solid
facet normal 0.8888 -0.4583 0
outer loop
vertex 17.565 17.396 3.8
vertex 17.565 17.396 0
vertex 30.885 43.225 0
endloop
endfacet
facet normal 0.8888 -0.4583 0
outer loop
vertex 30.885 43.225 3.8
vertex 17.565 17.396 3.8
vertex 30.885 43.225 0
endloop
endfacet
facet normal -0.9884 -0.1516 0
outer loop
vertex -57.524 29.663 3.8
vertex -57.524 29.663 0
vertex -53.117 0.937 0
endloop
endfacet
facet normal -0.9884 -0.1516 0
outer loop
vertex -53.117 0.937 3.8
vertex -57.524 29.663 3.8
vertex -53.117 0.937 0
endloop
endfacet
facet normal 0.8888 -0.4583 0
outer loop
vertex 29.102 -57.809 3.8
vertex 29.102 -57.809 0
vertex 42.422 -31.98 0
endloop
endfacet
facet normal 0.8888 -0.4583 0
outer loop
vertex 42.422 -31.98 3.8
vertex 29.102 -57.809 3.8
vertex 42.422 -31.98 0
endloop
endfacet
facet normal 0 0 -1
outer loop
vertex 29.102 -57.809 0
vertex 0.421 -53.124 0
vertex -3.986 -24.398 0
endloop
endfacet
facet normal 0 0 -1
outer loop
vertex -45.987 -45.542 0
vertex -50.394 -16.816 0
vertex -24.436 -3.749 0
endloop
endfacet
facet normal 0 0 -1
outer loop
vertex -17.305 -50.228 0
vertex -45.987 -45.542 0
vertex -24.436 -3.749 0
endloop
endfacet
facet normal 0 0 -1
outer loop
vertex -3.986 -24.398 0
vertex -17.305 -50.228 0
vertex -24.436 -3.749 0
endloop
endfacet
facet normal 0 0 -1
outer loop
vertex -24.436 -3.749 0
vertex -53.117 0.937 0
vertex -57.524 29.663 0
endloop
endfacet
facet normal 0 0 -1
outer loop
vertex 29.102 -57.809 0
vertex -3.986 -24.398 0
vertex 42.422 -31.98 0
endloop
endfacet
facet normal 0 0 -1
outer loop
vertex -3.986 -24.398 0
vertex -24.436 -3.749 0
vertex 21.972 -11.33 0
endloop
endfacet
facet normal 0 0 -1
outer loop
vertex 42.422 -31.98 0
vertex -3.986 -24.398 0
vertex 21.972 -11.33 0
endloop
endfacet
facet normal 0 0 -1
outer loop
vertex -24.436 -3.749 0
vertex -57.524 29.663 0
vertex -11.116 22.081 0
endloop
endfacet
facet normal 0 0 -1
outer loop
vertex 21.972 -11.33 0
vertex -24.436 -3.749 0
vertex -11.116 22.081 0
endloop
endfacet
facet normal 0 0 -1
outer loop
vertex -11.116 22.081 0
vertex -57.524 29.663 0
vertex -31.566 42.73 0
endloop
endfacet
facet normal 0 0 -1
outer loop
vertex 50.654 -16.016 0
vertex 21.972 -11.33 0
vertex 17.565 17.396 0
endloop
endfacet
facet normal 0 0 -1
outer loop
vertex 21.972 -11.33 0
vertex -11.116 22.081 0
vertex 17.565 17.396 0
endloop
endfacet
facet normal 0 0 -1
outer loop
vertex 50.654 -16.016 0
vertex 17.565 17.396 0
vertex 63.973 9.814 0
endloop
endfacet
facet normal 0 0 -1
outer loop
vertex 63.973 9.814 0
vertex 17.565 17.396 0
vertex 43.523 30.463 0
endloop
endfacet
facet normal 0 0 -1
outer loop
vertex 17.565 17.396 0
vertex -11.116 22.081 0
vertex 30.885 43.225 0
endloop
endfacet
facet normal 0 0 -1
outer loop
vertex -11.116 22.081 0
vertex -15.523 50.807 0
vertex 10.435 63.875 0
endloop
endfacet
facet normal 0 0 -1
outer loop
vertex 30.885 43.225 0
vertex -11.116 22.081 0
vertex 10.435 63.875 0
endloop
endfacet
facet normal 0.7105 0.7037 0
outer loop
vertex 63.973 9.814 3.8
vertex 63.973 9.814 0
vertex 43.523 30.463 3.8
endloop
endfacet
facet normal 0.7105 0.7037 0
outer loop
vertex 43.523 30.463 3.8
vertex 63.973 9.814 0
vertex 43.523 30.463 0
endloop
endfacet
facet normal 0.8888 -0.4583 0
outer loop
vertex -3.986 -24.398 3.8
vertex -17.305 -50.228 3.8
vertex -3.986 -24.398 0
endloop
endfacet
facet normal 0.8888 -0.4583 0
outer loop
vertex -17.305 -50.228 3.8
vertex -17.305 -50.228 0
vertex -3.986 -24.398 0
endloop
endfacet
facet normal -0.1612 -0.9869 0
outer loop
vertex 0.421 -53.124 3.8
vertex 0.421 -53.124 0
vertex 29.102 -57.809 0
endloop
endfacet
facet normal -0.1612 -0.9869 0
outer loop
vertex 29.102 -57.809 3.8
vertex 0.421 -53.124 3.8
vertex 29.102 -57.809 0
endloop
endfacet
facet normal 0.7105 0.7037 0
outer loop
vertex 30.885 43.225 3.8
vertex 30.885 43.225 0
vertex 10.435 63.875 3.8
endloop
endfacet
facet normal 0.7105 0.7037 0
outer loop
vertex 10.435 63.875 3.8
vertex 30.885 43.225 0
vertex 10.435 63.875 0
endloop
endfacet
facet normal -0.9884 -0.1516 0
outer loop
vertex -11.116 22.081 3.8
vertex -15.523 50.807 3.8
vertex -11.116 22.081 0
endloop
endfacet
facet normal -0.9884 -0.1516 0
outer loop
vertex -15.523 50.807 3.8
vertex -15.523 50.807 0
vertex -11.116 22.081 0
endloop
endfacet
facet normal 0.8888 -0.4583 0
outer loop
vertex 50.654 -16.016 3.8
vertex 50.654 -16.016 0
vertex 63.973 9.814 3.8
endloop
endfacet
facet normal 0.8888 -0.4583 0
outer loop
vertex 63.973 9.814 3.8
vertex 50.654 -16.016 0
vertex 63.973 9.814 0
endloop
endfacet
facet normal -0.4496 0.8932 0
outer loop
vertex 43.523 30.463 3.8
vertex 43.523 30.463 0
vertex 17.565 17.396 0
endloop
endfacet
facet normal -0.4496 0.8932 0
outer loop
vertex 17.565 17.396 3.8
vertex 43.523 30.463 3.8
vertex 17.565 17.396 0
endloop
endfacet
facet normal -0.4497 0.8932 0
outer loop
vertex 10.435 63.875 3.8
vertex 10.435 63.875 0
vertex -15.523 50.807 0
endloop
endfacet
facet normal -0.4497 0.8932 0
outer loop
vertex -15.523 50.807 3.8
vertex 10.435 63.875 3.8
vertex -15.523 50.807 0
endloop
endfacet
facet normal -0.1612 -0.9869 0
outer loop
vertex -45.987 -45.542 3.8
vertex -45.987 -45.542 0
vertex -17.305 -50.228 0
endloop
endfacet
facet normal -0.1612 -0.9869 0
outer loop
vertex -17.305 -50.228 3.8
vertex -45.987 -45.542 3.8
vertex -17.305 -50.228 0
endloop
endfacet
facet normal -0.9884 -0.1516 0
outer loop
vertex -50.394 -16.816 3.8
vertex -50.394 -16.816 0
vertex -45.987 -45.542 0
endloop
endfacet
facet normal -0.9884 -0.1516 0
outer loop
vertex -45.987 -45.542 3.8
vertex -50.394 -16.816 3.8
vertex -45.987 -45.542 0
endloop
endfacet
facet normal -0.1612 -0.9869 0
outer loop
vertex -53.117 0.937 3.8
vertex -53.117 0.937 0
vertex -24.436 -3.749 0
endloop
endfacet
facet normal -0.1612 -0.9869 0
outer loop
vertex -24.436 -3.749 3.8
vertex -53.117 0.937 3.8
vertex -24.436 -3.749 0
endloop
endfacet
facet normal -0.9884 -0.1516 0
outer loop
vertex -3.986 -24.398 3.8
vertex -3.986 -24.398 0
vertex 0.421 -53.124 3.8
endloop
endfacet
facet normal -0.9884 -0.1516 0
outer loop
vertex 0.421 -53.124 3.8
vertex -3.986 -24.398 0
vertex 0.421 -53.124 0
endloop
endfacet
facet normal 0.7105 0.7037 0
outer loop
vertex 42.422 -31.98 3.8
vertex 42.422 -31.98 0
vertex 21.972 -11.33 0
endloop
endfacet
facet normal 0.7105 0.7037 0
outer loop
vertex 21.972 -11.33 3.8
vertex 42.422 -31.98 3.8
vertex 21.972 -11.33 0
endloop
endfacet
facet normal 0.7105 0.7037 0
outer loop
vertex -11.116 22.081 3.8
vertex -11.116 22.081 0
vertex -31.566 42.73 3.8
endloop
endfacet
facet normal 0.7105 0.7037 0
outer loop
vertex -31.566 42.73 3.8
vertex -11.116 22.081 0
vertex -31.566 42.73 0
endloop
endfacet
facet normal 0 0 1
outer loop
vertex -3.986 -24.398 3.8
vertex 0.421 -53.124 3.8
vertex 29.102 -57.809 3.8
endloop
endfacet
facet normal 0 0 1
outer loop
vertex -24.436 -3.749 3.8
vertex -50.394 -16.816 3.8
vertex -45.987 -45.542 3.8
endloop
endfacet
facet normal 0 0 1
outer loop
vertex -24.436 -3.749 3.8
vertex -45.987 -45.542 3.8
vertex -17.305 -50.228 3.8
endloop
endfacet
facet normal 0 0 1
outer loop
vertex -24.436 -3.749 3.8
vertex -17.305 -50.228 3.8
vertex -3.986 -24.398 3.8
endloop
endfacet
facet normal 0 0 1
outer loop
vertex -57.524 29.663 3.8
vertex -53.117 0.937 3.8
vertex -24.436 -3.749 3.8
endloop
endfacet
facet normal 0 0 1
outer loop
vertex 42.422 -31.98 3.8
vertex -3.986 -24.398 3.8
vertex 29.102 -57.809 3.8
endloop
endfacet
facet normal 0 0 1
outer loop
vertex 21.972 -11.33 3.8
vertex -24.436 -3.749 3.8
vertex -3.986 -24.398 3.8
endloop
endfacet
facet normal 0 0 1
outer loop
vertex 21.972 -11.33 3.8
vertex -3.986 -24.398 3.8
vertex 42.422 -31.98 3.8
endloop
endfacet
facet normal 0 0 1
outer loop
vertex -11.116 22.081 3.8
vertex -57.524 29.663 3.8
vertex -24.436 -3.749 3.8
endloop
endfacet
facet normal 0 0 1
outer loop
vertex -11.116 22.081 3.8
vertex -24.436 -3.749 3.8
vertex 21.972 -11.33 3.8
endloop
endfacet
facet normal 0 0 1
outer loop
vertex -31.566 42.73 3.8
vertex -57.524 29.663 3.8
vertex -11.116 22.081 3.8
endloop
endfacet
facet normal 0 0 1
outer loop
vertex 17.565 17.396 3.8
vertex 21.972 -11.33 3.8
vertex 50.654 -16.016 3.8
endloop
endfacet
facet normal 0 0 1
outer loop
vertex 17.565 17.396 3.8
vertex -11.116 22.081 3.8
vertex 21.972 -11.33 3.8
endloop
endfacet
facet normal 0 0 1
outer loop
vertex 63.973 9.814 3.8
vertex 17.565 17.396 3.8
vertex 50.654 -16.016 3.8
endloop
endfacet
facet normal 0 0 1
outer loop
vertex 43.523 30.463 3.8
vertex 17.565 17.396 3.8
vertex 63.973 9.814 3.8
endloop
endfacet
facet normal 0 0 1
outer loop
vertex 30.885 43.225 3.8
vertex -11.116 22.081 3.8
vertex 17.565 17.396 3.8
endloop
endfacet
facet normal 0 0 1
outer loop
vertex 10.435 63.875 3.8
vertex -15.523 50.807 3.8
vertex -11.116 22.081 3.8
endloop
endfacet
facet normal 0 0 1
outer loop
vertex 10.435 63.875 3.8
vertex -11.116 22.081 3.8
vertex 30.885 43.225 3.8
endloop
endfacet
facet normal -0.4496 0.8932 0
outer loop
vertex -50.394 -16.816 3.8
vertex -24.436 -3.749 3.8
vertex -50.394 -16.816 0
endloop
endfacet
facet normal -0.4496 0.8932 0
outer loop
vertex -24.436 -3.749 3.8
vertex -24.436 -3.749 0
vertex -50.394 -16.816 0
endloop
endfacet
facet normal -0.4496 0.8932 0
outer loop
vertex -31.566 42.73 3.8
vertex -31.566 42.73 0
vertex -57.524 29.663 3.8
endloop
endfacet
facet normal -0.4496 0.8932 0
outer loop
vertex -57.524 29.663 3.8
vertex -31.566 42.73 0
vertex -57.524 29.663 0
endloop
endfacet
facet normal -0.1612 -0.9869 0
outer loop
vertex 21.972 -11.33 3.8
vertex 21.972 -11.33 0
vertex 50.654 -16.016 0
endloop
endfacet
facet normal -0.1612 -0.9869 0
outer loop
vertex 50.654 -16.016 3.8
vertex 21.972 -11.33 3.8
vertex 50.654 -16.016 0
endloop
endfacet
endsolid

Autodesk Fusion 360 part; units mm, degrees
sketch "Sketch1" plane through (0, 0, 0) normal (0, 0, 1) x (1, 0, 0)
  line L0 (17.5654, 17.3955) -> (-11.1161, 22.0812)
  line L1 (-11.1161, 22.0812) -> (-24.4355, -3.7486)
  line L2 (-24.4355, -3.7486) -> (-3.9858, -24.3979)
  line L3 (-3.9858, -24.3979) -> (21.9721, -11.3301)
  line L4 (21.9721, -11.3301) -> (17.5654, 17.3955)
  line L5 (17.5654, 17.3955) -> (21.9721, -11.3301)
  line L6 (21.9721, -11.3301) -> (50.6536, -16.0158)
  line L7 (50.6536, -16.0158) -> (63.973, 9.814)
  line L8 (63.973, 9.814) -> (43.5233, 30.4633)
  line L9 (43.5233, 30.4633) -> (17.5654, 17.3955)
  line L10 (17.5654, 17.3955) -> (30.8847, 43.2253)
  line L11 (30.8847, 43.2253) -> (10.4351, 63.8746)
  line L12 (10.4351, 63.8746) -> (-15.5229, 50.8068)
  line L13 (-15.5229, 50.8068) -> (-11.1161, 22.0812)
  line L14 (-11.1161, 22.0812) -> (17.5654, 17.3955)
  line L15 (-11.1161, 22.0812) -> (-31.5658, 42.7305)
  line L16 (-31.5658, 42.7305) -> (-57.5237, 29.6627)
  line L17 (-57.5237, 29.6627) -> (-53.117, 0.937)
  line L18 (-53.117, 0.937) -> (-24.4355, -3.7486)
  line L19 (-24.4355, -3.7486) -> (-11.1161, 22.0812)
  line L20 (-24.4355, -3.7486) -> (-50.3935, -16.8164)
  line L21 (-50.3935, -16.8164) -> (-45.9867, -45.542)
  line L22 (-45.9867, -45.542) -> (-17.3052, -50.2277)
  line L23 (-17.3052, -50.2277) -> (-3.9858, -24.3979)
  line L24 (-3.9858, -24.3979) -> (-24.4355, -3.7486)
  line L25 (-3.9858, -24.3979) -> (0.4209, -53.1236)
  line L26 (0.4209, -53.1236) -> (29.1024, -57.8092)
  line L27 (29.1024, -57.8092) -> (42.4218, -31.9795)
  line L28 (42.4218, -31.9795) -> (21.9721, -11.3301)
  line L29 (21.9721, -11.3301) -> (-3.9858, -24.3979)
  point P0 (39.5375, 6.0654)
  point P1 (6.4492, 39.4767)
  point P2 (-35.5516, 18.3326)
  point P3 (-28.4213, -28.1465)
  point P4 (17.9863, -35.7281)
  dimension "d1" = 20
extrude "Extrude1" add sketch "Sketch1" along normal blind 3.8
sketch "Sketch2" plane through (0, 0, 3.8) normal (0, 0, 1) x (-1, 0, 0)
  line L0 (-42.4218, 31.9795) -> (-21.9721, 11.3301)
  line L1 (-21.9721, 11.3301) -> (-50.6536, 16.0158)
  line L2 (-50.6536, 16.0158) -> (-63.973, -9.814)
  line L3 (-63.973, -9.814) -> (-43.5233, -30.4633)
  line L4 (-43.5233, -30.4633) -> (-17.5654, -17.3955)
  line L5 (-17.5654, -17.3955) -> (-30.8847, -43.2253)
  line L6 (-30.8847, -43.2253) -> (-10.4351, -63.8746)
  line L7 (-10.4351, -63.8746) -> (15.5229, -50.8068)
  line L8 (15.5229, -50.8068) -> (11.1161, -22.0812)
  line L9 (11.1161, -22.0812) -> (31.5658, -42.7305)
  line L10 (31.5658, -42.7305) -> (57.5237, -29.6627)
  line L11 (57.5237, -29.6627) -> (53.117, -0.937)
  line L12 (53.117, -0.937) -> (24.4355, 3.7486)
  line L13 (24.4355, 3.7486) -> (50.3935, 16.8164)
  line L14 (50.3935, 16.8164) -> (45.9867, 45.542)
  line L15 (45.9867, 45.542) -> (17.3052, 50.2277)
  line L16 (17.3052, 50.2277) -> (3.9858, 24.3979)
  line L17 (3.9858, 24.3979) -> (-0.4209, 53.1236)
  line L18 (-0.4209, 53.1236) -> (-29.1024, 57.8092)
  line L19 (-29.1024, 57.8092) -> (-42.4218, 31.9795)
